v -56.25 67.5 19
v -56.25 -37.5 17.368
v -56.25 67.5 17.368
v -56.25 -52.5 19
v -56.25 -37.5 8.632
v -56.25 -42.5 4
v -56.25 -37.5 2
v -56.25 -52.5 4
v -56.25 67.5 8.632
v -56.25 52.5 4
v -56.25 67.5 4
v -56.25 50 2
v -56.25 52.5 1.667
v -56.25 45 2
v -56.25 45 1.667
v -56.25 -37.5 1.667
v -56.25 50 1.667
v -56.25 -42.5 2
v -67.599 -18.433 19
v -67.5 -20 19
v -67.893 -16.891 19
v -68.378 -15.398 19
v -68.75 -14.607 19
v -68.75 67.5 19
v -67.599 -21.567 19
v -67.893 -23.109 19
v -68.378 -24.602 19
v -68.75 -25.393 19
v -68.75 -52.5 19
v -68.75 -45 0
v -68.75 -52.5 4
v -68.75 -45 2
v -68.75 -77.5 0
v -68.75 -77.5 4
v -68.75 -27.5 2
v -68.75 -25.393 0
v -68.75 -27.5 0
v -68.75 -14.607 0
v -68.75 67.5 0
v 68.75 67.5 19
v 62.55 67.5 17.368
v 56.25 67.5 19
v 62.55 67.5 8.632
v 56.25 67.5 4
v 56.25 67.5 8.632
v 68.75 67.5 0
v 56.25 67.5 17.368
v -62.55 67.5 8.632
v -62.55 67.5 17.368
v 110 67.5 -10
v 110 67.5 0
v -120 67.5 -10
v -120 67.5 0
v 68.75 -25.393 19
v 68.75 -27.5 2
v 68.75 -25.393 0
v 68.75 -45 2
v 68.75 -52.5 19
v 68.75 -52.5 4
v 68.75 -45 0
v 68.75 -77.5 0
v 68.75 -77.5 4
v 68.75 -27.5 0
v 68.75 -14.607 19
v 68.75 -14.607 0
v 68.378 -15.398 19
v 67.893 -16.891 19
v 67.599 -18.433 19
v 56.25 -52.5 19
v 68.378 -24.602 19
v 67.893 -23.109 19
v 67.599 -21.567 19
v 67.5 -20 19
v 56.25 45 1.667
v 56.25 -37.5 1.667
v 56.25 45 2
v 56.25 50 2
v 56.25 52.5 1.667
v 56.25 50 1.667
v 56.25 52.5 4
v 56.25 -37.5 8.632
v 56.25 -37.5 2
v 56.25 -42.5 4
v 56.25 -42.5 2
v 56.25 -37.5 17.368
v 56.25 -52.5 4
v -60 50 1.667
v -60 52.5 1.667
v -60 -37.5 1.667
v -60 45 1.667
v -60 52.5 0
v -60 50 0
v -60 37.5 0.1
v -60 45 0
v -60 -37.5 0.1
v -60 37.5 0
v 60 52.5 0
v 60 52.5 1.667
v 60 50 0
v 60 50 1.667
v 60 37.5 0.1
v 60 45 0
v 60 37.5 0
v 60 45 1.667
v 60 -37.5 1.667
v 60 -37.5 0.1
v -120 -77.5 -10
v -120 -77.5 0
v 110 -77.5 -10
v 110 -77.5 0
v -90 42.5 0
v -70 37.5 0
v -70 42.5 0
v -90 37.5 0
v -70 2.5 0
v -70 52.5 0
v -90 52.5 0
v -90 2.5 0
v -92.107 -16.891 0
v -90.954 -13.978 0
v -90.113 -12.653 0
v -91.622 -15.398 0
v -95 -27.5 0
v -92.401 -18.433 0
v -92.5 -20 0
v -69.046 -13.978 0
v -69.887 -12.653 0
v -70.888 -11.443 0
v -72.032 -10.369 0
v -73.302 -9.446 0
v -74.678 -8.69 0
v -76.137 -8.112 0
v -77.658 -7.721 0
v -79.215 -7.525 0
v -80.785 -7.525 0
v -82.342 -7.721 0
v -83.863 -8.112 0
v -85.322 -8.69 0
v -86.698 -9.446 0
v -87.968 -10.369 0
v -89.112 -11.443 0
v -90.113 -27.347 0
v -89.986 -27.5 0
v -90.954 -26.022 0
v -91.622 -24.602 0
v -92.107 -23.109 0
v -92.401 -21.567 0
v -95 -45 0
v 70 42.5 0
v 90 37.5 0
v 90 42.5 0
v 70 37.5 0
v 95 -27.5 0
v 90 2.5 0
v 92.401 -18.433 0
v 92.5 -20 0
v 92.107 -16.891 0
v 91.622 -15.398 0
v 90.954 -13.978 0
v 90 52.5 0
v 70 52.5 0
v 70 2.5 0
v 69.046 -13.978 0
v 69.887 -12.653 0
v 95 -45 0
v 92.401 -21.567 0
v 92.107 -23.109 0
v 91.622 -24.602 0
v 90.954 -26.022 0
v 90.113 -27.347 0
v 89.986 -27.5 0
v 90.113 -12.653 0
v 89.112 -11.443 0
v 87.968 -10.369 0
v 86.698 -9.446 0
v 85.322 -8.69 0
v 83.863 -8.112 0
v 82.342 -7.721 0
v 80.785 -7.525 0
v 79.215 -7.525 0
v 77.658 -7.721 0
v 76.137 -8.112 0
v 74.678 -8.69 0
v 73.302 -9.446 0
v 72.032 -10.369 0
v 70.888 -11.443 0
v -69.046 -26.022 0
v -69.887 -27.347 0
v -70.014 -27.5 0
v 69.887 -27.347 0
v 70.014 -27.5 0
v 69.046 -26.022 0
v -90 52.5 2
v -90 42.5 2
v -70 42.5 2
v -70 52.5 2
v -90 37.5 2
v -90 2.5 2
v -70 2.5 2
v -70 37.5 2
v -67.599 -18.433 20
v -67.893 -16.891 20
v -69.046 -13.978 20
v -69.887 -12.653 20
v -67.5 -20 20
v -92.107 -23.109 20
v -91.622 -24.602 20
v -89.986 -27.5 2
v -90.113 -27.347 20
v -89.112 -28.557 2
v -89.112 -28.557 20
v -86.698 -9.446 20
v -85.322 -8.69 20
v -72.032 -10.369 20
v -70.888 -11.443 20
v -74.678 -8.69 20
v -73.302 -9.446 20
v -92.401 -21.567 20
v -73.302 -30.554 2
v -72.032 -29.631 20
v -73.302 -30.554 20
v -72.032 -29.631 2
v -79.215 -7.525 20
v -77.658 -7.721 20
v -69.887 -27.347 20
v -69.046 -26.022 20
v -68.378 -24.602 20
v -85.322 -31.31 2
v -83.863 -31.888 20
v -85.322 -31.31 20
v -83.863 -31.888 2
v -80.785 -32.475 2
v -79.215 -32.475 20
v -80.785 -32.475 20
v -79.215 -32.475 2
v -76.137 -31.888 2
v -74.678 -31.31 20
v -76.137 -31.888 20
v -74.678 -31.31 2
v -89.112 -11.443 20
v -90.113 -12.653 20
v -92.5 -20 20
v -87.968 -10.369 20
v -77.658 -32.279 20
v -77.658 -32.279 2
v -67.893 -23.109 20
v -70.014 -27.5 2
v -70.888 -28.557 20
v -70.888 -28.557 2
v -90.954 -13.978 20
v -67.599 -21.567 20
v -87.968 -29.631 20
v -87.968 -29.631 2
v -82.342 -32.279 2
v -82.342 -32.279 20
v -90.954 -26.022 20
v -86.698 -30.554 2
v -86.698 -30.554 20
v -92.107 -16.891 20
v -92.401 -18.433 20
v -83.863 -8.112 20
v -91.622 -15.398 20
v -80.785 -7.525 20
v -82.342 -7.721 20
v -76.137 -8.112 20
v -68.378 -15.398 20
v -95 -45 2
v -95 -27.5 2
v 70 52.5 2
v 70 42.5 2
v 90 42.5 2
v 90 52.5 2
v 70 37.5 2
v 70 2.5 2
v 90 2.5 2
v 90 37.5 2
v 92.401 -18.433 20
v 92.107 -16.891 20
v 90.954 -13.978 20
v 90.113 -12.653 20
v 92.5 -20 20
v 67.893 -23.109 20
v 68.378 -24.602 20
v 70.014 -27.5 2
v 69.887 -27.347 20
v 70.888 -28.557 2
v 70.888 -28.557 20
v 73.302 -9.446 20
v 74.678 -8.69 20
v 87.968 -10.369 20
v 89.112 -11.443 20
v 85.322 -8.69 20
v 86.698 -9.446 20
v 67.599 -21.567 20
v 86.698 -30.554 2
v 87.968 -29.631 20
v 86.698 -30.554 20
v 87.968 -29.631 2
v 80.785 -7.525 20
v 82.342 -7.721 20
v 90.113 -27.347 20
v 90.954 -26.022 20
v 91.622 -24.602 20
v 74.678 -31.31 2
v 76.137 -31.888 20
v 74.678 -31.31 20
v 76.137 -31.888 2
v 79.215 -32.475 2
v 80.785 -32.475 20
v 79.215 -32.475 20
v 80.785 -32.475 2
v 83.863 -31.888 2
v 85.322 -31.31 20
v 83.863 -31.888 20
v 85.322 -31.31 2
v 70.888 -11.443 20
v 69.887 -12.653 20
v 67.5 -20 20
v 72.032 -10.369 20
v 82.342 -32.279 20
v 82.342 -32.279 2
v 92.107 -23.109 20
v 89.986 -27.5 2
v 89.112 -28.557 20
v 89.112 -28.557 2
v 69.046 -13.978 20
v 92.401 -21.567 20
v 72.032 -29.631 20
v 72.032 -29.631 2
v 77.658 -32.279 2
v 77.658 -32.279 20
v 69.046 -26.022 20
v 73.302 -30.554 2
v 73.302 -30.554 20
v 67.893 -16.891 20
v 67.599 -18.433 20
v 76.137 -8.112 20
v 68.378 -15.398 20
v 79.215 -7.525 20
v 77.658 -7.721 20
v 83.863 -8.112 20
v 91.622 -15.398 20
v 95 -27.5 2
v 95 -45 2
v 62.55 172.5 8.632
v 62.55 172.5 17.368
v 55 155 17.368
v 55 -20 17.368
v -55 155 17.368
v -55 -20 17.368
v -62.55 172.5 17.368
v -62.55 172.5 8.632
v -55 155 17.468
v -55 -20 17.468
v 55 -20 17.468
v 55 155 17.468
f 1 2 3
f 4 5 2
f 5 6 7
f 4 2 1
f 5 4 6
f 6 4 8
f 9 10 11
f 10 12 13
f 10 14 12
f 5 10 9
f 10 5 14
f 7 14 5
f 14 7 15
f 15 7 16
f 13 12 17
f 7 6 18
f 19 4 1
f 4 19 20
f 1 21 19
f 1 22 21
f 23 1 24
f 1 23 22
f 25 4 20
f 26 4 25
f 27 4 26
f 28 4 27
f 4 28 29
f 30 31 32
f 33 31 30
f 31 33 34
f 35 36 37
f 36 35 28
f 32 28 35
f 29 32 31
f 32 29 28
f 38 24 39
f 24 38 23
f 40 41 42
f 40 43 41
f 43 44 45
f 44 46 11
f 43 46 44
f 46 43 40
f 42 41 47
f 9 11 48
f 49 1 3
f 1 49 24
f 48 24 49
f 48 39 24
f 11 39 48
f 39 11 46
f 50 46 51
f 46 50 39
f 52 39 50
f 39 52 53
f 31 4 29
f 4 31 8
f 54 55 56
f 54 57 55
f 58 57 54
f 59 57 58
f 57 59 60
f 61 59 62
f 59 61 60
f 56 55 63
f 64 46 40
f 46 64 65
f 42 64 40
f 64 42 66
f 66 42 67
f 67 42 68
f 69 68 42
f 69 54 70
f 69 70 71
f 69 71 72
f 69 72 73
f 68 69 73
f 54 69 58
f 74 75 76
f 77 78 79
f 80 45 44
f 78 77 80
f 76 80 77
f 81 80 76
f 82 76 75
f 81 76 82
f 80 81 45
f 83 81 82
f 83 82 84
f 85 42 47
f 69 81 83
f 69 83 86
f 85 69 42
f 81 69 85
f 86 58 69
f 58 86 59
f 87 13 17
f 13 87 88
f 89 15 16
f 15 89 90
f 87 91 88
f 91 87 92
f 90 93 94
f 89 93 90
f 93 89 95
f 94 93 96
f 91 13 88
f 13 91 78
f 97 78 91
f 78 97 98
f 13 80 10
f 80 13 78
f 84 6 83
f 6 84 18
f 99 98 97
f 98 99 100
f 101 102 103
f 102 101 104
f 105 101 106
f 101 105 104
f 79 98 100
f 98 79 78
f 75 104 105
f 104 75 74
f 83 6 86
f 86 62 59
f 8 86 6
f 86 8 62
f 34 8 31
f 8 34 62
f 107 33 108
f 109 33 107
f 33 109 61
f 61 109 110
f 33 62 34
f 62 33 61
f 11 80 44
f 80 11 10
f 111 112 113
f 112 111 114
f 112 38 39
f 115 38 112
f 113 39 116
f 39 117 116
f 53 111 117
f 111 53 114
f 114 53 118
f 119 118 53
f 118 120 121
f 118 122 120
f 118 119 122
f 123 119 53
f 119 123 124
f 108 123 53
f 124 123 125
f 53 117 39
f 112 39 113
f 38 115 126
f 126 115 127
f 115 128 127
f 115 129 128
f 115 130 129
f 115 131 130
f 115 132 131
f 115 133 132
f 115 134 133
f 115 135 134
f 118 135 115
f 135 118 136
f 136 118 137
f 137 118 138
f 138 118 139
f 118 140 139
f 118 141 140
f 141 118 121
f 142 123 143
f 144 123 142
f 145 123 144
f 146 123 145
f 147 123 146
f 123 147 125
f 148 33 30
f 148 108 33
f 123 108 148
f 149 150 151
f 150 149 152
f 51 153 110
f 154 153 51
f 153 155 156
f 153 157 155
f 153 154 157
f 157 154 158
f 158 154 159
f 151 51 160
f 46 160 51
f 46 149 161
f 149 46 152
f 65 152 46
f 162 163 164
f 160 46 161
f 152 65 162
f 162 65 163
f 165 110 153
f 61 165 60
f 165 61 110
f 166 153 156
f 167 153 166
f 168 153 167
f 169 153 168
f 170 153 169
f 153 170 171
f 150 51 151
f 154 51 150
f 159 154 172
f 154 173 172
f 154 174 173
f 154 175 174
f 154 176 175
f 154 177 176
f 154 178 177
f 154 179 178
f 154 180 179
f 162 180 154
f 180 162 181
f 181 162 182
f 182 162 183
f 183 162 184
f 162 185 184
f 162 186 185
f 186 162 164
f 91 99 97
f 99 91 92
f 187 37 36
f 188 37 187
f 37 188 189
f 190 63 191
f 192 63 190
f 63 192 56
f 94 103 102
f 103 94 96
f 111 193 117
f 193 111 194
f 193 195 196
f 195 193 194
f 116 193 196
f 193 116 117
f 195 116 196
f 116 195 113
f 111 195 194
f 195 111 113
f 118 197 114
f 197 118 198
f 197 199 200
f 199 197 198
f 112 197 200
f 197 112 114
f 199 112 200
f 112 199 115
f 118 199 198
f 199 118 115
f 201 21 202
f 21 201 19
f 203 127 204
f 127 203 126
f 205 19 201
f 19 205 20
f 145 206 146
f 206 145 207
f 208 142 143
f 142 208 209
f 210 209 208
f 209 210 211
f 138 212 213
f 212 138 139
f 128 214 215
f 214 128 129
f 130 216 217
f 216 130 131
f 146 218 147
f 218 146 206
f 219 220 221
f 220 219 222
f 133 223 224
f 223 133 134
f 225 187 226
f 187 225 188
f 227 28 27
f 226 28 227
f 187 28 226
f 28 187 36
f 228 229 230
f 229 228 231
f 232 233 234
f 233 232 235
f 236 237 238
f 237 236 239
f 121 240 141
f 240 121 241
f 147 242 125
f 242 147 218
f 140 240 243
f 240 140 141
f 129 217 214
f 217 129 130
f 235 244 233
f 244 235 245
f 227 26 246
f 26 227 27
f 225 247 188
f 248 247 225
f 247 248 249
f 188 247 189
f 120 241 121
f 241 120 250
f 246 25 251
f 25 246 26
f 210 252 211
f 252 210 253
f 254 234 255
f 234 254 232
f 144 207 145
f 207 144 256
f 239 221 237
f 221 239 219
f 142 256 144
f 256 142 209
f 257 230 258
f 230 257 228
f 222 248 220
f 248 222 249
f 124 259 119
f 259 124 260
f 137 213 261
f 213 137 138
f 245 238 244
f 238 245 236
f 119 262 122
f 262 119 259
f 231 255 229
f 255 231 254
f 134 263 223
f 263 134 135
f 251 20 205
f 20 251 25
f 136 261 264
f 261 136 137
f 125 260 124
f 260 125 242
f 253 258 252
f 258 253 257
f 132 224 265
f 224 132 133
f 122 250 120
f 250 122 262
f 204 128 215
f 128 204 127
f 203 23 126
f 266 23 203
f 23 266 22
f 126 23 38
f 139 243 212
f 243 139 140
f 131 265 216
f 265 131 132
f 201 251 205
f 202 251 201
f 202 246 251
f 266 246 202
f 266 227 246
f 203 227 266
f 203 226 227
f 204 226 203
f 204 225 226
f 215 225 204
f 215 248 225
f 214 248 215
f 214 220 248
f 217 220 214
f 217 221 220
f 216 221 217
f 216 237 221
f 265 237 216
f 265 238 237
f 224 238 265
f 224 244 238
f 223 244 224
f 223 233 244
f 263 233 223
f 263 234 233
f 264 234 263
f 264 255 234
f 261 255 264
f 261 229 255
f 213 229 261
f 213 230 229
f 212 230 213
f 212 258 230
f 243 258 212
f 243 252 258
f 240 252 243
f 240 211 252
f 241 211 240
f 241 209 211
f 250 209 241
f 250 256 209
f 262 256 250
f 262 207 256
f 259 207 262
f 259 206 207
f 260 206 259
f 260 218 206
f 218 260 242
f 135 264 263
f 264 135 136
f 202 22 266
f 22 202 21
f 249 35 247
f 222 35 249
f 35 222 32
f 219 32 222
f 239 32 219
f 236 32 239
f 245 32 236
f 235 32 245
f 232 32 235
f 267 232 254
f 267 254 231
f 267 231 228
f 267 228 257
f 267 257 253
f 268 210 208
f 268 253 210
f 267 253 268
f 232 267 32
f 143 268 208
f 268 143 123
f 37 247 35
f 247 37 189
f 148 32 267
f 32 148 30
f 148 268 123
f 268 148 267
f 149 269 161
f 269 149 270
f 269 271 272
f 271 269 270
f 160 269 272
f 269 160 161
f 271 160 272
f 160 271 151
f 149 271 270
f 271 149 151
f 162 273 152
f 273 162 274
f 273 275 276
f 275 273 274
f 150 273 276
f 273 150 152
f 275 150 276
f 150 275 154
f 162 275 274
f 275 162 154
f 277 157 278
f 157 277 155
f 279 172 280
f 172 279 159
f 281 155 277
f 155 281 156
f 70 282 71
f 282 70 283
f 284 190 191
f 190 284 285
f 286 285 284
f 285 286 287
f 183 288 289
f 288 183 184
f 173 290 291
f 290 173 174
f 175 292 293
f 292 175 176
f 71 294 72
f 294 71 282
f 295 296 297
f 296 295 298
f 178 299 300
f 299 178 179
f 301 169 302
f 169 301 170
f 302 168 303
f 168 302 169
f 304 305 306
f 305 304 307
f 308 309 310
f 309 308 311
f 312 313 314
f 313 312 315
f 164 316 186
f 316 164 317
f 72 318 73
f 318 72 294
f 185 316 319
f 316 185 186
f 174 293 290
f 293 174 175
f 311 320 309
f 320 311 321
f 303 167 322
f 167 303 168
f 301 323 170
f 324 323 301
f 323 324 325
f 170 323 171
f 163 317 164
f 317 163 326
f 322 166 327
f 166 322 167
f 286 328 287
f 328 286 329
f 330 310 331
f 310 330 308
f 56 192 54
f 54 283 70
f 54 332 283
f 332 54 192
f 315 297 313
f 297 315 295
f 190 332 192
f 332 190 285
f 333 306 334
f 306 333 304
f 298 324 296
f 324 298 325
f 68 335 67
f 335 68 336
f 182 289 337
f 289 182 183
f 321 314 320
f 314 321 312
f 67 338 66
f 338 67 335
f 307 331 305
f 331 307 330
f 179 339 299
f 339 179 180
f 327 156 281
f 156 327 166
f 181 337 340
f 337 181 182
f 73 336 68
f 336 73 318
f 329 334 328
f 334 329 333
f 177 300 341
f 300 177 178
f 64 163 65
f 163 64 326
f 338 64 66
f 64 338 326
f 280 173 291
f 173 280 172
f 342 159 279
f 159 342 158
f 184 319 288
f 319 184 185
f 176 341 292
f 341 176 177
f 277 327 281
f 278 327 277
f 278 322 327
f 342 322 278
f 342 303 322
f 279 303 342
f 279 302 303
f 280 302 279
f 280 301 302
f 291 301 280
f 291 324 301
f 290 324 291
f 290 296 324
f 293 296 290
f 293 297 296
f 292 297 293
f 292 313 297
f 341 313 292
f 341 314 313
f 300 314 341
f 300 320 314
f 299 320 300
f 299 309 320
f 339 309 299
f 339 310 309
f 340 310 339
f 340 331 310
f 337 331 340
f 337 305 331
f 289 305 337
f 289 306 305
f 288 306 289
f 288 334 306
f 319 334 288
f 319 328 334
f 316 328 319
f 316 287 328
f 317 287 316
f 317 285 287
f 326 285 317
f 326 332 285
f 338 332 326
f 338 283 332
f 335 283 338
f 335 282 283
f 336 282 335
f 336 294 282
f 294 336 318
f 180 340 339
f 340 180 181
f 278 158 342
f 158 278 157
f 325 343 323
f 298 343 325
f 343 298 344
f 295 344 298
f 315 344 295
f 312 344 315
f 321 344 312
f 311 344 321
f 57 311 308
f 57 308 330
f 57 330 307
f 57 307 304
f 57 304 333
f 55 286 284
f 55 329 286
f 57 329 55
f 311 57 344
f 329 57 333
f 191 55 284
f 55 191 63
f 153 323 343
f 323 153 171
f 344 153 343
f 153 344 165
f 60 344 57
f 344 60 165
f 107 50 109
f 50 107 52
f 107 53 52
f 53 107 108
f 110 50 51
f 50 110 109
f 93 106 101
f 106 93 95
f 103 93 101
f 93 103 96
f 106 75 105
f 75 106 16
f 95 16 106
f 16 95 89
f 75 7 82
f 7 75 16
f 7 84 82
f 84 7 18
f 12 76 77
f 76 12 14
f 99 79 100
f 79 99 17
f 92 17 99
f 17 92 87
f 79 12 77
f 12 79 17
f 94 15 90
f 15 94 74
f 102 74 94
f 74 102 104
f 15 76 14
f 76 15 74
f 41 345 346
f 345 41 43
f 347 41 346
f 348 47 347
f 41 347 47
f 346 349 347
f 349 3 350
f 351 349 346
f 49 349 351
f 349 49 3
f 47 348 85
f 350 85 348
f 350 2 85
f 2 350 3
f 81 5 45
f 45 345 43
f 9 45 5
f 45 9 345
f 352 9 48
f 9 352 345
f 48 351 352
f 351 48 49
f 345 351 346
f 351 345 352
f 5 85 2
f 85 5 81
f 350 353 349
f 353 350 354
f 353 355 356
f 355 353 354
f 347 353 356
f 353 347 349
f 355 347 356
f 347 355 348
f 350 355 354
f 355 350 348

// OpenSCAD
// file: mount.scad
use <dash.scad>
use <tablet.scad>

module mount(){
    module _mount(){
        arm_depth = 20;
        module arm() {
            for(i=[-1,1]) translate([i*62.5,07.5,arm_depth/2])cube([12.5, 120, arm_depth], center=true);
        }
        difference(){
            arm();
            for(i=[-1,1]) translate([i*57.5,05,arm_depth/60-01])cube([5, 95, arm_depth/3], center=true);
        }
        
        plate_depth = 05;
        translate([0,-60,plate_depth/2])cube([137.5, 35, plate_depth], center=true);
        translate([0,60,plate_depth/2])cube([137.5, 15, plate_depth], center=true);
    }
    difference() {
        translate([0,0,-01])_mount();
        translate([-05,-05,0])dash();
        translate([0,67.5,13])tablet();
    }
}
mount();
// file: tablet.scad
module tablet(){
    module tablet_cm(){
        total_dims = [12.51, 21, 0.8736];
        screen_dims = [11, 17.5];
        color("LightBlue")cube(total_dims, center=true);
        color("Blue")translate([0,0, total_dims[2]/2])linear_extrude(height=0.01)square(screen_dims, center=true);   
    }
    scale([10,10,10])tablet_cm();
}
tablet();
// file: dash.scad
module dash(){
    module dash_cm(){
        total_area_dims = [23, 14.5];
        
        // total dash
        color("LightBlue")translate([0,0,-1])linear_extrude(height=1)square(total_area_dims, center=true);
        
        // screen
        screen_dims = [12, 7.5];
        screen_center = [0.5, 0.5, 0];
        color("Blue")translate(screen_center)linear_extrude(height=.01)square(screen_dims, center=true);
        
        // buttons
        button_height = 0.2;
        
        radio_button_dims = [screen_dims[0], 0.5];
        radio_button_center = screen_center + [0, -((screen_dims[1]/2)+radio_button_dims[1]/2)];
        color("DodgerBlue")translate(radio_button_center)linear_extrude(height=button_height)square(radio_button_dims, center=true);
        
        // cd player
        cd_player_dims = [13, 0.5];
        cd_player_center = screen_center + [0, screen_dims[1]/2 + 1];
        color("DodgerBlue")translate(cd_player_center)linear_extrude(height=button_height)square(cd_player_dims, center=true);
        
        module side_buttons() {
            color("DeepSkyBlue")translate([0,1,0])linear_extrude(height=button_height)square([2,1], center=true);
            color("DeepSkyBlue")translate([0,-1.75/2,0])linear_extrude(height=button_height)square([2,1.75], center=true);
            color("blue")translate([0,-1.75 * 3/2,0])linear_extrude(height=button_height)square([2,1.75], center=true);
            
            color("CornflowerBlue")translate([0,-5.75,0])linear_extrude(height=2)circle(1.25, $fn=50);
            color("DeepSkyBlue")translate([1.5/2,-5.75 - 2.5 + (1.75/2),0])linear_extrude(height=button_height)square([1.5,1.75], center=true);
            color("blue")translate([-1.5/2,-5.75 - 2.5 + (1.75/2),0])linear_extrude(height=button_height)square([1.5,1.75], center=true);
        }
        for(i=[-1,1]) translate(screen_center + [i*(screen_dims[0]/2+2), screen_dims[1]/2, 0])side_buttons();
    }
    scale([10,10,10])dash_cm();
}
dash();
// main file
use <dash.scad>
use <tablet.scad>
use <mount.scad>

mount();
translate([-05,-05,0])dash();
translate([0,67.5,13])tablet();
